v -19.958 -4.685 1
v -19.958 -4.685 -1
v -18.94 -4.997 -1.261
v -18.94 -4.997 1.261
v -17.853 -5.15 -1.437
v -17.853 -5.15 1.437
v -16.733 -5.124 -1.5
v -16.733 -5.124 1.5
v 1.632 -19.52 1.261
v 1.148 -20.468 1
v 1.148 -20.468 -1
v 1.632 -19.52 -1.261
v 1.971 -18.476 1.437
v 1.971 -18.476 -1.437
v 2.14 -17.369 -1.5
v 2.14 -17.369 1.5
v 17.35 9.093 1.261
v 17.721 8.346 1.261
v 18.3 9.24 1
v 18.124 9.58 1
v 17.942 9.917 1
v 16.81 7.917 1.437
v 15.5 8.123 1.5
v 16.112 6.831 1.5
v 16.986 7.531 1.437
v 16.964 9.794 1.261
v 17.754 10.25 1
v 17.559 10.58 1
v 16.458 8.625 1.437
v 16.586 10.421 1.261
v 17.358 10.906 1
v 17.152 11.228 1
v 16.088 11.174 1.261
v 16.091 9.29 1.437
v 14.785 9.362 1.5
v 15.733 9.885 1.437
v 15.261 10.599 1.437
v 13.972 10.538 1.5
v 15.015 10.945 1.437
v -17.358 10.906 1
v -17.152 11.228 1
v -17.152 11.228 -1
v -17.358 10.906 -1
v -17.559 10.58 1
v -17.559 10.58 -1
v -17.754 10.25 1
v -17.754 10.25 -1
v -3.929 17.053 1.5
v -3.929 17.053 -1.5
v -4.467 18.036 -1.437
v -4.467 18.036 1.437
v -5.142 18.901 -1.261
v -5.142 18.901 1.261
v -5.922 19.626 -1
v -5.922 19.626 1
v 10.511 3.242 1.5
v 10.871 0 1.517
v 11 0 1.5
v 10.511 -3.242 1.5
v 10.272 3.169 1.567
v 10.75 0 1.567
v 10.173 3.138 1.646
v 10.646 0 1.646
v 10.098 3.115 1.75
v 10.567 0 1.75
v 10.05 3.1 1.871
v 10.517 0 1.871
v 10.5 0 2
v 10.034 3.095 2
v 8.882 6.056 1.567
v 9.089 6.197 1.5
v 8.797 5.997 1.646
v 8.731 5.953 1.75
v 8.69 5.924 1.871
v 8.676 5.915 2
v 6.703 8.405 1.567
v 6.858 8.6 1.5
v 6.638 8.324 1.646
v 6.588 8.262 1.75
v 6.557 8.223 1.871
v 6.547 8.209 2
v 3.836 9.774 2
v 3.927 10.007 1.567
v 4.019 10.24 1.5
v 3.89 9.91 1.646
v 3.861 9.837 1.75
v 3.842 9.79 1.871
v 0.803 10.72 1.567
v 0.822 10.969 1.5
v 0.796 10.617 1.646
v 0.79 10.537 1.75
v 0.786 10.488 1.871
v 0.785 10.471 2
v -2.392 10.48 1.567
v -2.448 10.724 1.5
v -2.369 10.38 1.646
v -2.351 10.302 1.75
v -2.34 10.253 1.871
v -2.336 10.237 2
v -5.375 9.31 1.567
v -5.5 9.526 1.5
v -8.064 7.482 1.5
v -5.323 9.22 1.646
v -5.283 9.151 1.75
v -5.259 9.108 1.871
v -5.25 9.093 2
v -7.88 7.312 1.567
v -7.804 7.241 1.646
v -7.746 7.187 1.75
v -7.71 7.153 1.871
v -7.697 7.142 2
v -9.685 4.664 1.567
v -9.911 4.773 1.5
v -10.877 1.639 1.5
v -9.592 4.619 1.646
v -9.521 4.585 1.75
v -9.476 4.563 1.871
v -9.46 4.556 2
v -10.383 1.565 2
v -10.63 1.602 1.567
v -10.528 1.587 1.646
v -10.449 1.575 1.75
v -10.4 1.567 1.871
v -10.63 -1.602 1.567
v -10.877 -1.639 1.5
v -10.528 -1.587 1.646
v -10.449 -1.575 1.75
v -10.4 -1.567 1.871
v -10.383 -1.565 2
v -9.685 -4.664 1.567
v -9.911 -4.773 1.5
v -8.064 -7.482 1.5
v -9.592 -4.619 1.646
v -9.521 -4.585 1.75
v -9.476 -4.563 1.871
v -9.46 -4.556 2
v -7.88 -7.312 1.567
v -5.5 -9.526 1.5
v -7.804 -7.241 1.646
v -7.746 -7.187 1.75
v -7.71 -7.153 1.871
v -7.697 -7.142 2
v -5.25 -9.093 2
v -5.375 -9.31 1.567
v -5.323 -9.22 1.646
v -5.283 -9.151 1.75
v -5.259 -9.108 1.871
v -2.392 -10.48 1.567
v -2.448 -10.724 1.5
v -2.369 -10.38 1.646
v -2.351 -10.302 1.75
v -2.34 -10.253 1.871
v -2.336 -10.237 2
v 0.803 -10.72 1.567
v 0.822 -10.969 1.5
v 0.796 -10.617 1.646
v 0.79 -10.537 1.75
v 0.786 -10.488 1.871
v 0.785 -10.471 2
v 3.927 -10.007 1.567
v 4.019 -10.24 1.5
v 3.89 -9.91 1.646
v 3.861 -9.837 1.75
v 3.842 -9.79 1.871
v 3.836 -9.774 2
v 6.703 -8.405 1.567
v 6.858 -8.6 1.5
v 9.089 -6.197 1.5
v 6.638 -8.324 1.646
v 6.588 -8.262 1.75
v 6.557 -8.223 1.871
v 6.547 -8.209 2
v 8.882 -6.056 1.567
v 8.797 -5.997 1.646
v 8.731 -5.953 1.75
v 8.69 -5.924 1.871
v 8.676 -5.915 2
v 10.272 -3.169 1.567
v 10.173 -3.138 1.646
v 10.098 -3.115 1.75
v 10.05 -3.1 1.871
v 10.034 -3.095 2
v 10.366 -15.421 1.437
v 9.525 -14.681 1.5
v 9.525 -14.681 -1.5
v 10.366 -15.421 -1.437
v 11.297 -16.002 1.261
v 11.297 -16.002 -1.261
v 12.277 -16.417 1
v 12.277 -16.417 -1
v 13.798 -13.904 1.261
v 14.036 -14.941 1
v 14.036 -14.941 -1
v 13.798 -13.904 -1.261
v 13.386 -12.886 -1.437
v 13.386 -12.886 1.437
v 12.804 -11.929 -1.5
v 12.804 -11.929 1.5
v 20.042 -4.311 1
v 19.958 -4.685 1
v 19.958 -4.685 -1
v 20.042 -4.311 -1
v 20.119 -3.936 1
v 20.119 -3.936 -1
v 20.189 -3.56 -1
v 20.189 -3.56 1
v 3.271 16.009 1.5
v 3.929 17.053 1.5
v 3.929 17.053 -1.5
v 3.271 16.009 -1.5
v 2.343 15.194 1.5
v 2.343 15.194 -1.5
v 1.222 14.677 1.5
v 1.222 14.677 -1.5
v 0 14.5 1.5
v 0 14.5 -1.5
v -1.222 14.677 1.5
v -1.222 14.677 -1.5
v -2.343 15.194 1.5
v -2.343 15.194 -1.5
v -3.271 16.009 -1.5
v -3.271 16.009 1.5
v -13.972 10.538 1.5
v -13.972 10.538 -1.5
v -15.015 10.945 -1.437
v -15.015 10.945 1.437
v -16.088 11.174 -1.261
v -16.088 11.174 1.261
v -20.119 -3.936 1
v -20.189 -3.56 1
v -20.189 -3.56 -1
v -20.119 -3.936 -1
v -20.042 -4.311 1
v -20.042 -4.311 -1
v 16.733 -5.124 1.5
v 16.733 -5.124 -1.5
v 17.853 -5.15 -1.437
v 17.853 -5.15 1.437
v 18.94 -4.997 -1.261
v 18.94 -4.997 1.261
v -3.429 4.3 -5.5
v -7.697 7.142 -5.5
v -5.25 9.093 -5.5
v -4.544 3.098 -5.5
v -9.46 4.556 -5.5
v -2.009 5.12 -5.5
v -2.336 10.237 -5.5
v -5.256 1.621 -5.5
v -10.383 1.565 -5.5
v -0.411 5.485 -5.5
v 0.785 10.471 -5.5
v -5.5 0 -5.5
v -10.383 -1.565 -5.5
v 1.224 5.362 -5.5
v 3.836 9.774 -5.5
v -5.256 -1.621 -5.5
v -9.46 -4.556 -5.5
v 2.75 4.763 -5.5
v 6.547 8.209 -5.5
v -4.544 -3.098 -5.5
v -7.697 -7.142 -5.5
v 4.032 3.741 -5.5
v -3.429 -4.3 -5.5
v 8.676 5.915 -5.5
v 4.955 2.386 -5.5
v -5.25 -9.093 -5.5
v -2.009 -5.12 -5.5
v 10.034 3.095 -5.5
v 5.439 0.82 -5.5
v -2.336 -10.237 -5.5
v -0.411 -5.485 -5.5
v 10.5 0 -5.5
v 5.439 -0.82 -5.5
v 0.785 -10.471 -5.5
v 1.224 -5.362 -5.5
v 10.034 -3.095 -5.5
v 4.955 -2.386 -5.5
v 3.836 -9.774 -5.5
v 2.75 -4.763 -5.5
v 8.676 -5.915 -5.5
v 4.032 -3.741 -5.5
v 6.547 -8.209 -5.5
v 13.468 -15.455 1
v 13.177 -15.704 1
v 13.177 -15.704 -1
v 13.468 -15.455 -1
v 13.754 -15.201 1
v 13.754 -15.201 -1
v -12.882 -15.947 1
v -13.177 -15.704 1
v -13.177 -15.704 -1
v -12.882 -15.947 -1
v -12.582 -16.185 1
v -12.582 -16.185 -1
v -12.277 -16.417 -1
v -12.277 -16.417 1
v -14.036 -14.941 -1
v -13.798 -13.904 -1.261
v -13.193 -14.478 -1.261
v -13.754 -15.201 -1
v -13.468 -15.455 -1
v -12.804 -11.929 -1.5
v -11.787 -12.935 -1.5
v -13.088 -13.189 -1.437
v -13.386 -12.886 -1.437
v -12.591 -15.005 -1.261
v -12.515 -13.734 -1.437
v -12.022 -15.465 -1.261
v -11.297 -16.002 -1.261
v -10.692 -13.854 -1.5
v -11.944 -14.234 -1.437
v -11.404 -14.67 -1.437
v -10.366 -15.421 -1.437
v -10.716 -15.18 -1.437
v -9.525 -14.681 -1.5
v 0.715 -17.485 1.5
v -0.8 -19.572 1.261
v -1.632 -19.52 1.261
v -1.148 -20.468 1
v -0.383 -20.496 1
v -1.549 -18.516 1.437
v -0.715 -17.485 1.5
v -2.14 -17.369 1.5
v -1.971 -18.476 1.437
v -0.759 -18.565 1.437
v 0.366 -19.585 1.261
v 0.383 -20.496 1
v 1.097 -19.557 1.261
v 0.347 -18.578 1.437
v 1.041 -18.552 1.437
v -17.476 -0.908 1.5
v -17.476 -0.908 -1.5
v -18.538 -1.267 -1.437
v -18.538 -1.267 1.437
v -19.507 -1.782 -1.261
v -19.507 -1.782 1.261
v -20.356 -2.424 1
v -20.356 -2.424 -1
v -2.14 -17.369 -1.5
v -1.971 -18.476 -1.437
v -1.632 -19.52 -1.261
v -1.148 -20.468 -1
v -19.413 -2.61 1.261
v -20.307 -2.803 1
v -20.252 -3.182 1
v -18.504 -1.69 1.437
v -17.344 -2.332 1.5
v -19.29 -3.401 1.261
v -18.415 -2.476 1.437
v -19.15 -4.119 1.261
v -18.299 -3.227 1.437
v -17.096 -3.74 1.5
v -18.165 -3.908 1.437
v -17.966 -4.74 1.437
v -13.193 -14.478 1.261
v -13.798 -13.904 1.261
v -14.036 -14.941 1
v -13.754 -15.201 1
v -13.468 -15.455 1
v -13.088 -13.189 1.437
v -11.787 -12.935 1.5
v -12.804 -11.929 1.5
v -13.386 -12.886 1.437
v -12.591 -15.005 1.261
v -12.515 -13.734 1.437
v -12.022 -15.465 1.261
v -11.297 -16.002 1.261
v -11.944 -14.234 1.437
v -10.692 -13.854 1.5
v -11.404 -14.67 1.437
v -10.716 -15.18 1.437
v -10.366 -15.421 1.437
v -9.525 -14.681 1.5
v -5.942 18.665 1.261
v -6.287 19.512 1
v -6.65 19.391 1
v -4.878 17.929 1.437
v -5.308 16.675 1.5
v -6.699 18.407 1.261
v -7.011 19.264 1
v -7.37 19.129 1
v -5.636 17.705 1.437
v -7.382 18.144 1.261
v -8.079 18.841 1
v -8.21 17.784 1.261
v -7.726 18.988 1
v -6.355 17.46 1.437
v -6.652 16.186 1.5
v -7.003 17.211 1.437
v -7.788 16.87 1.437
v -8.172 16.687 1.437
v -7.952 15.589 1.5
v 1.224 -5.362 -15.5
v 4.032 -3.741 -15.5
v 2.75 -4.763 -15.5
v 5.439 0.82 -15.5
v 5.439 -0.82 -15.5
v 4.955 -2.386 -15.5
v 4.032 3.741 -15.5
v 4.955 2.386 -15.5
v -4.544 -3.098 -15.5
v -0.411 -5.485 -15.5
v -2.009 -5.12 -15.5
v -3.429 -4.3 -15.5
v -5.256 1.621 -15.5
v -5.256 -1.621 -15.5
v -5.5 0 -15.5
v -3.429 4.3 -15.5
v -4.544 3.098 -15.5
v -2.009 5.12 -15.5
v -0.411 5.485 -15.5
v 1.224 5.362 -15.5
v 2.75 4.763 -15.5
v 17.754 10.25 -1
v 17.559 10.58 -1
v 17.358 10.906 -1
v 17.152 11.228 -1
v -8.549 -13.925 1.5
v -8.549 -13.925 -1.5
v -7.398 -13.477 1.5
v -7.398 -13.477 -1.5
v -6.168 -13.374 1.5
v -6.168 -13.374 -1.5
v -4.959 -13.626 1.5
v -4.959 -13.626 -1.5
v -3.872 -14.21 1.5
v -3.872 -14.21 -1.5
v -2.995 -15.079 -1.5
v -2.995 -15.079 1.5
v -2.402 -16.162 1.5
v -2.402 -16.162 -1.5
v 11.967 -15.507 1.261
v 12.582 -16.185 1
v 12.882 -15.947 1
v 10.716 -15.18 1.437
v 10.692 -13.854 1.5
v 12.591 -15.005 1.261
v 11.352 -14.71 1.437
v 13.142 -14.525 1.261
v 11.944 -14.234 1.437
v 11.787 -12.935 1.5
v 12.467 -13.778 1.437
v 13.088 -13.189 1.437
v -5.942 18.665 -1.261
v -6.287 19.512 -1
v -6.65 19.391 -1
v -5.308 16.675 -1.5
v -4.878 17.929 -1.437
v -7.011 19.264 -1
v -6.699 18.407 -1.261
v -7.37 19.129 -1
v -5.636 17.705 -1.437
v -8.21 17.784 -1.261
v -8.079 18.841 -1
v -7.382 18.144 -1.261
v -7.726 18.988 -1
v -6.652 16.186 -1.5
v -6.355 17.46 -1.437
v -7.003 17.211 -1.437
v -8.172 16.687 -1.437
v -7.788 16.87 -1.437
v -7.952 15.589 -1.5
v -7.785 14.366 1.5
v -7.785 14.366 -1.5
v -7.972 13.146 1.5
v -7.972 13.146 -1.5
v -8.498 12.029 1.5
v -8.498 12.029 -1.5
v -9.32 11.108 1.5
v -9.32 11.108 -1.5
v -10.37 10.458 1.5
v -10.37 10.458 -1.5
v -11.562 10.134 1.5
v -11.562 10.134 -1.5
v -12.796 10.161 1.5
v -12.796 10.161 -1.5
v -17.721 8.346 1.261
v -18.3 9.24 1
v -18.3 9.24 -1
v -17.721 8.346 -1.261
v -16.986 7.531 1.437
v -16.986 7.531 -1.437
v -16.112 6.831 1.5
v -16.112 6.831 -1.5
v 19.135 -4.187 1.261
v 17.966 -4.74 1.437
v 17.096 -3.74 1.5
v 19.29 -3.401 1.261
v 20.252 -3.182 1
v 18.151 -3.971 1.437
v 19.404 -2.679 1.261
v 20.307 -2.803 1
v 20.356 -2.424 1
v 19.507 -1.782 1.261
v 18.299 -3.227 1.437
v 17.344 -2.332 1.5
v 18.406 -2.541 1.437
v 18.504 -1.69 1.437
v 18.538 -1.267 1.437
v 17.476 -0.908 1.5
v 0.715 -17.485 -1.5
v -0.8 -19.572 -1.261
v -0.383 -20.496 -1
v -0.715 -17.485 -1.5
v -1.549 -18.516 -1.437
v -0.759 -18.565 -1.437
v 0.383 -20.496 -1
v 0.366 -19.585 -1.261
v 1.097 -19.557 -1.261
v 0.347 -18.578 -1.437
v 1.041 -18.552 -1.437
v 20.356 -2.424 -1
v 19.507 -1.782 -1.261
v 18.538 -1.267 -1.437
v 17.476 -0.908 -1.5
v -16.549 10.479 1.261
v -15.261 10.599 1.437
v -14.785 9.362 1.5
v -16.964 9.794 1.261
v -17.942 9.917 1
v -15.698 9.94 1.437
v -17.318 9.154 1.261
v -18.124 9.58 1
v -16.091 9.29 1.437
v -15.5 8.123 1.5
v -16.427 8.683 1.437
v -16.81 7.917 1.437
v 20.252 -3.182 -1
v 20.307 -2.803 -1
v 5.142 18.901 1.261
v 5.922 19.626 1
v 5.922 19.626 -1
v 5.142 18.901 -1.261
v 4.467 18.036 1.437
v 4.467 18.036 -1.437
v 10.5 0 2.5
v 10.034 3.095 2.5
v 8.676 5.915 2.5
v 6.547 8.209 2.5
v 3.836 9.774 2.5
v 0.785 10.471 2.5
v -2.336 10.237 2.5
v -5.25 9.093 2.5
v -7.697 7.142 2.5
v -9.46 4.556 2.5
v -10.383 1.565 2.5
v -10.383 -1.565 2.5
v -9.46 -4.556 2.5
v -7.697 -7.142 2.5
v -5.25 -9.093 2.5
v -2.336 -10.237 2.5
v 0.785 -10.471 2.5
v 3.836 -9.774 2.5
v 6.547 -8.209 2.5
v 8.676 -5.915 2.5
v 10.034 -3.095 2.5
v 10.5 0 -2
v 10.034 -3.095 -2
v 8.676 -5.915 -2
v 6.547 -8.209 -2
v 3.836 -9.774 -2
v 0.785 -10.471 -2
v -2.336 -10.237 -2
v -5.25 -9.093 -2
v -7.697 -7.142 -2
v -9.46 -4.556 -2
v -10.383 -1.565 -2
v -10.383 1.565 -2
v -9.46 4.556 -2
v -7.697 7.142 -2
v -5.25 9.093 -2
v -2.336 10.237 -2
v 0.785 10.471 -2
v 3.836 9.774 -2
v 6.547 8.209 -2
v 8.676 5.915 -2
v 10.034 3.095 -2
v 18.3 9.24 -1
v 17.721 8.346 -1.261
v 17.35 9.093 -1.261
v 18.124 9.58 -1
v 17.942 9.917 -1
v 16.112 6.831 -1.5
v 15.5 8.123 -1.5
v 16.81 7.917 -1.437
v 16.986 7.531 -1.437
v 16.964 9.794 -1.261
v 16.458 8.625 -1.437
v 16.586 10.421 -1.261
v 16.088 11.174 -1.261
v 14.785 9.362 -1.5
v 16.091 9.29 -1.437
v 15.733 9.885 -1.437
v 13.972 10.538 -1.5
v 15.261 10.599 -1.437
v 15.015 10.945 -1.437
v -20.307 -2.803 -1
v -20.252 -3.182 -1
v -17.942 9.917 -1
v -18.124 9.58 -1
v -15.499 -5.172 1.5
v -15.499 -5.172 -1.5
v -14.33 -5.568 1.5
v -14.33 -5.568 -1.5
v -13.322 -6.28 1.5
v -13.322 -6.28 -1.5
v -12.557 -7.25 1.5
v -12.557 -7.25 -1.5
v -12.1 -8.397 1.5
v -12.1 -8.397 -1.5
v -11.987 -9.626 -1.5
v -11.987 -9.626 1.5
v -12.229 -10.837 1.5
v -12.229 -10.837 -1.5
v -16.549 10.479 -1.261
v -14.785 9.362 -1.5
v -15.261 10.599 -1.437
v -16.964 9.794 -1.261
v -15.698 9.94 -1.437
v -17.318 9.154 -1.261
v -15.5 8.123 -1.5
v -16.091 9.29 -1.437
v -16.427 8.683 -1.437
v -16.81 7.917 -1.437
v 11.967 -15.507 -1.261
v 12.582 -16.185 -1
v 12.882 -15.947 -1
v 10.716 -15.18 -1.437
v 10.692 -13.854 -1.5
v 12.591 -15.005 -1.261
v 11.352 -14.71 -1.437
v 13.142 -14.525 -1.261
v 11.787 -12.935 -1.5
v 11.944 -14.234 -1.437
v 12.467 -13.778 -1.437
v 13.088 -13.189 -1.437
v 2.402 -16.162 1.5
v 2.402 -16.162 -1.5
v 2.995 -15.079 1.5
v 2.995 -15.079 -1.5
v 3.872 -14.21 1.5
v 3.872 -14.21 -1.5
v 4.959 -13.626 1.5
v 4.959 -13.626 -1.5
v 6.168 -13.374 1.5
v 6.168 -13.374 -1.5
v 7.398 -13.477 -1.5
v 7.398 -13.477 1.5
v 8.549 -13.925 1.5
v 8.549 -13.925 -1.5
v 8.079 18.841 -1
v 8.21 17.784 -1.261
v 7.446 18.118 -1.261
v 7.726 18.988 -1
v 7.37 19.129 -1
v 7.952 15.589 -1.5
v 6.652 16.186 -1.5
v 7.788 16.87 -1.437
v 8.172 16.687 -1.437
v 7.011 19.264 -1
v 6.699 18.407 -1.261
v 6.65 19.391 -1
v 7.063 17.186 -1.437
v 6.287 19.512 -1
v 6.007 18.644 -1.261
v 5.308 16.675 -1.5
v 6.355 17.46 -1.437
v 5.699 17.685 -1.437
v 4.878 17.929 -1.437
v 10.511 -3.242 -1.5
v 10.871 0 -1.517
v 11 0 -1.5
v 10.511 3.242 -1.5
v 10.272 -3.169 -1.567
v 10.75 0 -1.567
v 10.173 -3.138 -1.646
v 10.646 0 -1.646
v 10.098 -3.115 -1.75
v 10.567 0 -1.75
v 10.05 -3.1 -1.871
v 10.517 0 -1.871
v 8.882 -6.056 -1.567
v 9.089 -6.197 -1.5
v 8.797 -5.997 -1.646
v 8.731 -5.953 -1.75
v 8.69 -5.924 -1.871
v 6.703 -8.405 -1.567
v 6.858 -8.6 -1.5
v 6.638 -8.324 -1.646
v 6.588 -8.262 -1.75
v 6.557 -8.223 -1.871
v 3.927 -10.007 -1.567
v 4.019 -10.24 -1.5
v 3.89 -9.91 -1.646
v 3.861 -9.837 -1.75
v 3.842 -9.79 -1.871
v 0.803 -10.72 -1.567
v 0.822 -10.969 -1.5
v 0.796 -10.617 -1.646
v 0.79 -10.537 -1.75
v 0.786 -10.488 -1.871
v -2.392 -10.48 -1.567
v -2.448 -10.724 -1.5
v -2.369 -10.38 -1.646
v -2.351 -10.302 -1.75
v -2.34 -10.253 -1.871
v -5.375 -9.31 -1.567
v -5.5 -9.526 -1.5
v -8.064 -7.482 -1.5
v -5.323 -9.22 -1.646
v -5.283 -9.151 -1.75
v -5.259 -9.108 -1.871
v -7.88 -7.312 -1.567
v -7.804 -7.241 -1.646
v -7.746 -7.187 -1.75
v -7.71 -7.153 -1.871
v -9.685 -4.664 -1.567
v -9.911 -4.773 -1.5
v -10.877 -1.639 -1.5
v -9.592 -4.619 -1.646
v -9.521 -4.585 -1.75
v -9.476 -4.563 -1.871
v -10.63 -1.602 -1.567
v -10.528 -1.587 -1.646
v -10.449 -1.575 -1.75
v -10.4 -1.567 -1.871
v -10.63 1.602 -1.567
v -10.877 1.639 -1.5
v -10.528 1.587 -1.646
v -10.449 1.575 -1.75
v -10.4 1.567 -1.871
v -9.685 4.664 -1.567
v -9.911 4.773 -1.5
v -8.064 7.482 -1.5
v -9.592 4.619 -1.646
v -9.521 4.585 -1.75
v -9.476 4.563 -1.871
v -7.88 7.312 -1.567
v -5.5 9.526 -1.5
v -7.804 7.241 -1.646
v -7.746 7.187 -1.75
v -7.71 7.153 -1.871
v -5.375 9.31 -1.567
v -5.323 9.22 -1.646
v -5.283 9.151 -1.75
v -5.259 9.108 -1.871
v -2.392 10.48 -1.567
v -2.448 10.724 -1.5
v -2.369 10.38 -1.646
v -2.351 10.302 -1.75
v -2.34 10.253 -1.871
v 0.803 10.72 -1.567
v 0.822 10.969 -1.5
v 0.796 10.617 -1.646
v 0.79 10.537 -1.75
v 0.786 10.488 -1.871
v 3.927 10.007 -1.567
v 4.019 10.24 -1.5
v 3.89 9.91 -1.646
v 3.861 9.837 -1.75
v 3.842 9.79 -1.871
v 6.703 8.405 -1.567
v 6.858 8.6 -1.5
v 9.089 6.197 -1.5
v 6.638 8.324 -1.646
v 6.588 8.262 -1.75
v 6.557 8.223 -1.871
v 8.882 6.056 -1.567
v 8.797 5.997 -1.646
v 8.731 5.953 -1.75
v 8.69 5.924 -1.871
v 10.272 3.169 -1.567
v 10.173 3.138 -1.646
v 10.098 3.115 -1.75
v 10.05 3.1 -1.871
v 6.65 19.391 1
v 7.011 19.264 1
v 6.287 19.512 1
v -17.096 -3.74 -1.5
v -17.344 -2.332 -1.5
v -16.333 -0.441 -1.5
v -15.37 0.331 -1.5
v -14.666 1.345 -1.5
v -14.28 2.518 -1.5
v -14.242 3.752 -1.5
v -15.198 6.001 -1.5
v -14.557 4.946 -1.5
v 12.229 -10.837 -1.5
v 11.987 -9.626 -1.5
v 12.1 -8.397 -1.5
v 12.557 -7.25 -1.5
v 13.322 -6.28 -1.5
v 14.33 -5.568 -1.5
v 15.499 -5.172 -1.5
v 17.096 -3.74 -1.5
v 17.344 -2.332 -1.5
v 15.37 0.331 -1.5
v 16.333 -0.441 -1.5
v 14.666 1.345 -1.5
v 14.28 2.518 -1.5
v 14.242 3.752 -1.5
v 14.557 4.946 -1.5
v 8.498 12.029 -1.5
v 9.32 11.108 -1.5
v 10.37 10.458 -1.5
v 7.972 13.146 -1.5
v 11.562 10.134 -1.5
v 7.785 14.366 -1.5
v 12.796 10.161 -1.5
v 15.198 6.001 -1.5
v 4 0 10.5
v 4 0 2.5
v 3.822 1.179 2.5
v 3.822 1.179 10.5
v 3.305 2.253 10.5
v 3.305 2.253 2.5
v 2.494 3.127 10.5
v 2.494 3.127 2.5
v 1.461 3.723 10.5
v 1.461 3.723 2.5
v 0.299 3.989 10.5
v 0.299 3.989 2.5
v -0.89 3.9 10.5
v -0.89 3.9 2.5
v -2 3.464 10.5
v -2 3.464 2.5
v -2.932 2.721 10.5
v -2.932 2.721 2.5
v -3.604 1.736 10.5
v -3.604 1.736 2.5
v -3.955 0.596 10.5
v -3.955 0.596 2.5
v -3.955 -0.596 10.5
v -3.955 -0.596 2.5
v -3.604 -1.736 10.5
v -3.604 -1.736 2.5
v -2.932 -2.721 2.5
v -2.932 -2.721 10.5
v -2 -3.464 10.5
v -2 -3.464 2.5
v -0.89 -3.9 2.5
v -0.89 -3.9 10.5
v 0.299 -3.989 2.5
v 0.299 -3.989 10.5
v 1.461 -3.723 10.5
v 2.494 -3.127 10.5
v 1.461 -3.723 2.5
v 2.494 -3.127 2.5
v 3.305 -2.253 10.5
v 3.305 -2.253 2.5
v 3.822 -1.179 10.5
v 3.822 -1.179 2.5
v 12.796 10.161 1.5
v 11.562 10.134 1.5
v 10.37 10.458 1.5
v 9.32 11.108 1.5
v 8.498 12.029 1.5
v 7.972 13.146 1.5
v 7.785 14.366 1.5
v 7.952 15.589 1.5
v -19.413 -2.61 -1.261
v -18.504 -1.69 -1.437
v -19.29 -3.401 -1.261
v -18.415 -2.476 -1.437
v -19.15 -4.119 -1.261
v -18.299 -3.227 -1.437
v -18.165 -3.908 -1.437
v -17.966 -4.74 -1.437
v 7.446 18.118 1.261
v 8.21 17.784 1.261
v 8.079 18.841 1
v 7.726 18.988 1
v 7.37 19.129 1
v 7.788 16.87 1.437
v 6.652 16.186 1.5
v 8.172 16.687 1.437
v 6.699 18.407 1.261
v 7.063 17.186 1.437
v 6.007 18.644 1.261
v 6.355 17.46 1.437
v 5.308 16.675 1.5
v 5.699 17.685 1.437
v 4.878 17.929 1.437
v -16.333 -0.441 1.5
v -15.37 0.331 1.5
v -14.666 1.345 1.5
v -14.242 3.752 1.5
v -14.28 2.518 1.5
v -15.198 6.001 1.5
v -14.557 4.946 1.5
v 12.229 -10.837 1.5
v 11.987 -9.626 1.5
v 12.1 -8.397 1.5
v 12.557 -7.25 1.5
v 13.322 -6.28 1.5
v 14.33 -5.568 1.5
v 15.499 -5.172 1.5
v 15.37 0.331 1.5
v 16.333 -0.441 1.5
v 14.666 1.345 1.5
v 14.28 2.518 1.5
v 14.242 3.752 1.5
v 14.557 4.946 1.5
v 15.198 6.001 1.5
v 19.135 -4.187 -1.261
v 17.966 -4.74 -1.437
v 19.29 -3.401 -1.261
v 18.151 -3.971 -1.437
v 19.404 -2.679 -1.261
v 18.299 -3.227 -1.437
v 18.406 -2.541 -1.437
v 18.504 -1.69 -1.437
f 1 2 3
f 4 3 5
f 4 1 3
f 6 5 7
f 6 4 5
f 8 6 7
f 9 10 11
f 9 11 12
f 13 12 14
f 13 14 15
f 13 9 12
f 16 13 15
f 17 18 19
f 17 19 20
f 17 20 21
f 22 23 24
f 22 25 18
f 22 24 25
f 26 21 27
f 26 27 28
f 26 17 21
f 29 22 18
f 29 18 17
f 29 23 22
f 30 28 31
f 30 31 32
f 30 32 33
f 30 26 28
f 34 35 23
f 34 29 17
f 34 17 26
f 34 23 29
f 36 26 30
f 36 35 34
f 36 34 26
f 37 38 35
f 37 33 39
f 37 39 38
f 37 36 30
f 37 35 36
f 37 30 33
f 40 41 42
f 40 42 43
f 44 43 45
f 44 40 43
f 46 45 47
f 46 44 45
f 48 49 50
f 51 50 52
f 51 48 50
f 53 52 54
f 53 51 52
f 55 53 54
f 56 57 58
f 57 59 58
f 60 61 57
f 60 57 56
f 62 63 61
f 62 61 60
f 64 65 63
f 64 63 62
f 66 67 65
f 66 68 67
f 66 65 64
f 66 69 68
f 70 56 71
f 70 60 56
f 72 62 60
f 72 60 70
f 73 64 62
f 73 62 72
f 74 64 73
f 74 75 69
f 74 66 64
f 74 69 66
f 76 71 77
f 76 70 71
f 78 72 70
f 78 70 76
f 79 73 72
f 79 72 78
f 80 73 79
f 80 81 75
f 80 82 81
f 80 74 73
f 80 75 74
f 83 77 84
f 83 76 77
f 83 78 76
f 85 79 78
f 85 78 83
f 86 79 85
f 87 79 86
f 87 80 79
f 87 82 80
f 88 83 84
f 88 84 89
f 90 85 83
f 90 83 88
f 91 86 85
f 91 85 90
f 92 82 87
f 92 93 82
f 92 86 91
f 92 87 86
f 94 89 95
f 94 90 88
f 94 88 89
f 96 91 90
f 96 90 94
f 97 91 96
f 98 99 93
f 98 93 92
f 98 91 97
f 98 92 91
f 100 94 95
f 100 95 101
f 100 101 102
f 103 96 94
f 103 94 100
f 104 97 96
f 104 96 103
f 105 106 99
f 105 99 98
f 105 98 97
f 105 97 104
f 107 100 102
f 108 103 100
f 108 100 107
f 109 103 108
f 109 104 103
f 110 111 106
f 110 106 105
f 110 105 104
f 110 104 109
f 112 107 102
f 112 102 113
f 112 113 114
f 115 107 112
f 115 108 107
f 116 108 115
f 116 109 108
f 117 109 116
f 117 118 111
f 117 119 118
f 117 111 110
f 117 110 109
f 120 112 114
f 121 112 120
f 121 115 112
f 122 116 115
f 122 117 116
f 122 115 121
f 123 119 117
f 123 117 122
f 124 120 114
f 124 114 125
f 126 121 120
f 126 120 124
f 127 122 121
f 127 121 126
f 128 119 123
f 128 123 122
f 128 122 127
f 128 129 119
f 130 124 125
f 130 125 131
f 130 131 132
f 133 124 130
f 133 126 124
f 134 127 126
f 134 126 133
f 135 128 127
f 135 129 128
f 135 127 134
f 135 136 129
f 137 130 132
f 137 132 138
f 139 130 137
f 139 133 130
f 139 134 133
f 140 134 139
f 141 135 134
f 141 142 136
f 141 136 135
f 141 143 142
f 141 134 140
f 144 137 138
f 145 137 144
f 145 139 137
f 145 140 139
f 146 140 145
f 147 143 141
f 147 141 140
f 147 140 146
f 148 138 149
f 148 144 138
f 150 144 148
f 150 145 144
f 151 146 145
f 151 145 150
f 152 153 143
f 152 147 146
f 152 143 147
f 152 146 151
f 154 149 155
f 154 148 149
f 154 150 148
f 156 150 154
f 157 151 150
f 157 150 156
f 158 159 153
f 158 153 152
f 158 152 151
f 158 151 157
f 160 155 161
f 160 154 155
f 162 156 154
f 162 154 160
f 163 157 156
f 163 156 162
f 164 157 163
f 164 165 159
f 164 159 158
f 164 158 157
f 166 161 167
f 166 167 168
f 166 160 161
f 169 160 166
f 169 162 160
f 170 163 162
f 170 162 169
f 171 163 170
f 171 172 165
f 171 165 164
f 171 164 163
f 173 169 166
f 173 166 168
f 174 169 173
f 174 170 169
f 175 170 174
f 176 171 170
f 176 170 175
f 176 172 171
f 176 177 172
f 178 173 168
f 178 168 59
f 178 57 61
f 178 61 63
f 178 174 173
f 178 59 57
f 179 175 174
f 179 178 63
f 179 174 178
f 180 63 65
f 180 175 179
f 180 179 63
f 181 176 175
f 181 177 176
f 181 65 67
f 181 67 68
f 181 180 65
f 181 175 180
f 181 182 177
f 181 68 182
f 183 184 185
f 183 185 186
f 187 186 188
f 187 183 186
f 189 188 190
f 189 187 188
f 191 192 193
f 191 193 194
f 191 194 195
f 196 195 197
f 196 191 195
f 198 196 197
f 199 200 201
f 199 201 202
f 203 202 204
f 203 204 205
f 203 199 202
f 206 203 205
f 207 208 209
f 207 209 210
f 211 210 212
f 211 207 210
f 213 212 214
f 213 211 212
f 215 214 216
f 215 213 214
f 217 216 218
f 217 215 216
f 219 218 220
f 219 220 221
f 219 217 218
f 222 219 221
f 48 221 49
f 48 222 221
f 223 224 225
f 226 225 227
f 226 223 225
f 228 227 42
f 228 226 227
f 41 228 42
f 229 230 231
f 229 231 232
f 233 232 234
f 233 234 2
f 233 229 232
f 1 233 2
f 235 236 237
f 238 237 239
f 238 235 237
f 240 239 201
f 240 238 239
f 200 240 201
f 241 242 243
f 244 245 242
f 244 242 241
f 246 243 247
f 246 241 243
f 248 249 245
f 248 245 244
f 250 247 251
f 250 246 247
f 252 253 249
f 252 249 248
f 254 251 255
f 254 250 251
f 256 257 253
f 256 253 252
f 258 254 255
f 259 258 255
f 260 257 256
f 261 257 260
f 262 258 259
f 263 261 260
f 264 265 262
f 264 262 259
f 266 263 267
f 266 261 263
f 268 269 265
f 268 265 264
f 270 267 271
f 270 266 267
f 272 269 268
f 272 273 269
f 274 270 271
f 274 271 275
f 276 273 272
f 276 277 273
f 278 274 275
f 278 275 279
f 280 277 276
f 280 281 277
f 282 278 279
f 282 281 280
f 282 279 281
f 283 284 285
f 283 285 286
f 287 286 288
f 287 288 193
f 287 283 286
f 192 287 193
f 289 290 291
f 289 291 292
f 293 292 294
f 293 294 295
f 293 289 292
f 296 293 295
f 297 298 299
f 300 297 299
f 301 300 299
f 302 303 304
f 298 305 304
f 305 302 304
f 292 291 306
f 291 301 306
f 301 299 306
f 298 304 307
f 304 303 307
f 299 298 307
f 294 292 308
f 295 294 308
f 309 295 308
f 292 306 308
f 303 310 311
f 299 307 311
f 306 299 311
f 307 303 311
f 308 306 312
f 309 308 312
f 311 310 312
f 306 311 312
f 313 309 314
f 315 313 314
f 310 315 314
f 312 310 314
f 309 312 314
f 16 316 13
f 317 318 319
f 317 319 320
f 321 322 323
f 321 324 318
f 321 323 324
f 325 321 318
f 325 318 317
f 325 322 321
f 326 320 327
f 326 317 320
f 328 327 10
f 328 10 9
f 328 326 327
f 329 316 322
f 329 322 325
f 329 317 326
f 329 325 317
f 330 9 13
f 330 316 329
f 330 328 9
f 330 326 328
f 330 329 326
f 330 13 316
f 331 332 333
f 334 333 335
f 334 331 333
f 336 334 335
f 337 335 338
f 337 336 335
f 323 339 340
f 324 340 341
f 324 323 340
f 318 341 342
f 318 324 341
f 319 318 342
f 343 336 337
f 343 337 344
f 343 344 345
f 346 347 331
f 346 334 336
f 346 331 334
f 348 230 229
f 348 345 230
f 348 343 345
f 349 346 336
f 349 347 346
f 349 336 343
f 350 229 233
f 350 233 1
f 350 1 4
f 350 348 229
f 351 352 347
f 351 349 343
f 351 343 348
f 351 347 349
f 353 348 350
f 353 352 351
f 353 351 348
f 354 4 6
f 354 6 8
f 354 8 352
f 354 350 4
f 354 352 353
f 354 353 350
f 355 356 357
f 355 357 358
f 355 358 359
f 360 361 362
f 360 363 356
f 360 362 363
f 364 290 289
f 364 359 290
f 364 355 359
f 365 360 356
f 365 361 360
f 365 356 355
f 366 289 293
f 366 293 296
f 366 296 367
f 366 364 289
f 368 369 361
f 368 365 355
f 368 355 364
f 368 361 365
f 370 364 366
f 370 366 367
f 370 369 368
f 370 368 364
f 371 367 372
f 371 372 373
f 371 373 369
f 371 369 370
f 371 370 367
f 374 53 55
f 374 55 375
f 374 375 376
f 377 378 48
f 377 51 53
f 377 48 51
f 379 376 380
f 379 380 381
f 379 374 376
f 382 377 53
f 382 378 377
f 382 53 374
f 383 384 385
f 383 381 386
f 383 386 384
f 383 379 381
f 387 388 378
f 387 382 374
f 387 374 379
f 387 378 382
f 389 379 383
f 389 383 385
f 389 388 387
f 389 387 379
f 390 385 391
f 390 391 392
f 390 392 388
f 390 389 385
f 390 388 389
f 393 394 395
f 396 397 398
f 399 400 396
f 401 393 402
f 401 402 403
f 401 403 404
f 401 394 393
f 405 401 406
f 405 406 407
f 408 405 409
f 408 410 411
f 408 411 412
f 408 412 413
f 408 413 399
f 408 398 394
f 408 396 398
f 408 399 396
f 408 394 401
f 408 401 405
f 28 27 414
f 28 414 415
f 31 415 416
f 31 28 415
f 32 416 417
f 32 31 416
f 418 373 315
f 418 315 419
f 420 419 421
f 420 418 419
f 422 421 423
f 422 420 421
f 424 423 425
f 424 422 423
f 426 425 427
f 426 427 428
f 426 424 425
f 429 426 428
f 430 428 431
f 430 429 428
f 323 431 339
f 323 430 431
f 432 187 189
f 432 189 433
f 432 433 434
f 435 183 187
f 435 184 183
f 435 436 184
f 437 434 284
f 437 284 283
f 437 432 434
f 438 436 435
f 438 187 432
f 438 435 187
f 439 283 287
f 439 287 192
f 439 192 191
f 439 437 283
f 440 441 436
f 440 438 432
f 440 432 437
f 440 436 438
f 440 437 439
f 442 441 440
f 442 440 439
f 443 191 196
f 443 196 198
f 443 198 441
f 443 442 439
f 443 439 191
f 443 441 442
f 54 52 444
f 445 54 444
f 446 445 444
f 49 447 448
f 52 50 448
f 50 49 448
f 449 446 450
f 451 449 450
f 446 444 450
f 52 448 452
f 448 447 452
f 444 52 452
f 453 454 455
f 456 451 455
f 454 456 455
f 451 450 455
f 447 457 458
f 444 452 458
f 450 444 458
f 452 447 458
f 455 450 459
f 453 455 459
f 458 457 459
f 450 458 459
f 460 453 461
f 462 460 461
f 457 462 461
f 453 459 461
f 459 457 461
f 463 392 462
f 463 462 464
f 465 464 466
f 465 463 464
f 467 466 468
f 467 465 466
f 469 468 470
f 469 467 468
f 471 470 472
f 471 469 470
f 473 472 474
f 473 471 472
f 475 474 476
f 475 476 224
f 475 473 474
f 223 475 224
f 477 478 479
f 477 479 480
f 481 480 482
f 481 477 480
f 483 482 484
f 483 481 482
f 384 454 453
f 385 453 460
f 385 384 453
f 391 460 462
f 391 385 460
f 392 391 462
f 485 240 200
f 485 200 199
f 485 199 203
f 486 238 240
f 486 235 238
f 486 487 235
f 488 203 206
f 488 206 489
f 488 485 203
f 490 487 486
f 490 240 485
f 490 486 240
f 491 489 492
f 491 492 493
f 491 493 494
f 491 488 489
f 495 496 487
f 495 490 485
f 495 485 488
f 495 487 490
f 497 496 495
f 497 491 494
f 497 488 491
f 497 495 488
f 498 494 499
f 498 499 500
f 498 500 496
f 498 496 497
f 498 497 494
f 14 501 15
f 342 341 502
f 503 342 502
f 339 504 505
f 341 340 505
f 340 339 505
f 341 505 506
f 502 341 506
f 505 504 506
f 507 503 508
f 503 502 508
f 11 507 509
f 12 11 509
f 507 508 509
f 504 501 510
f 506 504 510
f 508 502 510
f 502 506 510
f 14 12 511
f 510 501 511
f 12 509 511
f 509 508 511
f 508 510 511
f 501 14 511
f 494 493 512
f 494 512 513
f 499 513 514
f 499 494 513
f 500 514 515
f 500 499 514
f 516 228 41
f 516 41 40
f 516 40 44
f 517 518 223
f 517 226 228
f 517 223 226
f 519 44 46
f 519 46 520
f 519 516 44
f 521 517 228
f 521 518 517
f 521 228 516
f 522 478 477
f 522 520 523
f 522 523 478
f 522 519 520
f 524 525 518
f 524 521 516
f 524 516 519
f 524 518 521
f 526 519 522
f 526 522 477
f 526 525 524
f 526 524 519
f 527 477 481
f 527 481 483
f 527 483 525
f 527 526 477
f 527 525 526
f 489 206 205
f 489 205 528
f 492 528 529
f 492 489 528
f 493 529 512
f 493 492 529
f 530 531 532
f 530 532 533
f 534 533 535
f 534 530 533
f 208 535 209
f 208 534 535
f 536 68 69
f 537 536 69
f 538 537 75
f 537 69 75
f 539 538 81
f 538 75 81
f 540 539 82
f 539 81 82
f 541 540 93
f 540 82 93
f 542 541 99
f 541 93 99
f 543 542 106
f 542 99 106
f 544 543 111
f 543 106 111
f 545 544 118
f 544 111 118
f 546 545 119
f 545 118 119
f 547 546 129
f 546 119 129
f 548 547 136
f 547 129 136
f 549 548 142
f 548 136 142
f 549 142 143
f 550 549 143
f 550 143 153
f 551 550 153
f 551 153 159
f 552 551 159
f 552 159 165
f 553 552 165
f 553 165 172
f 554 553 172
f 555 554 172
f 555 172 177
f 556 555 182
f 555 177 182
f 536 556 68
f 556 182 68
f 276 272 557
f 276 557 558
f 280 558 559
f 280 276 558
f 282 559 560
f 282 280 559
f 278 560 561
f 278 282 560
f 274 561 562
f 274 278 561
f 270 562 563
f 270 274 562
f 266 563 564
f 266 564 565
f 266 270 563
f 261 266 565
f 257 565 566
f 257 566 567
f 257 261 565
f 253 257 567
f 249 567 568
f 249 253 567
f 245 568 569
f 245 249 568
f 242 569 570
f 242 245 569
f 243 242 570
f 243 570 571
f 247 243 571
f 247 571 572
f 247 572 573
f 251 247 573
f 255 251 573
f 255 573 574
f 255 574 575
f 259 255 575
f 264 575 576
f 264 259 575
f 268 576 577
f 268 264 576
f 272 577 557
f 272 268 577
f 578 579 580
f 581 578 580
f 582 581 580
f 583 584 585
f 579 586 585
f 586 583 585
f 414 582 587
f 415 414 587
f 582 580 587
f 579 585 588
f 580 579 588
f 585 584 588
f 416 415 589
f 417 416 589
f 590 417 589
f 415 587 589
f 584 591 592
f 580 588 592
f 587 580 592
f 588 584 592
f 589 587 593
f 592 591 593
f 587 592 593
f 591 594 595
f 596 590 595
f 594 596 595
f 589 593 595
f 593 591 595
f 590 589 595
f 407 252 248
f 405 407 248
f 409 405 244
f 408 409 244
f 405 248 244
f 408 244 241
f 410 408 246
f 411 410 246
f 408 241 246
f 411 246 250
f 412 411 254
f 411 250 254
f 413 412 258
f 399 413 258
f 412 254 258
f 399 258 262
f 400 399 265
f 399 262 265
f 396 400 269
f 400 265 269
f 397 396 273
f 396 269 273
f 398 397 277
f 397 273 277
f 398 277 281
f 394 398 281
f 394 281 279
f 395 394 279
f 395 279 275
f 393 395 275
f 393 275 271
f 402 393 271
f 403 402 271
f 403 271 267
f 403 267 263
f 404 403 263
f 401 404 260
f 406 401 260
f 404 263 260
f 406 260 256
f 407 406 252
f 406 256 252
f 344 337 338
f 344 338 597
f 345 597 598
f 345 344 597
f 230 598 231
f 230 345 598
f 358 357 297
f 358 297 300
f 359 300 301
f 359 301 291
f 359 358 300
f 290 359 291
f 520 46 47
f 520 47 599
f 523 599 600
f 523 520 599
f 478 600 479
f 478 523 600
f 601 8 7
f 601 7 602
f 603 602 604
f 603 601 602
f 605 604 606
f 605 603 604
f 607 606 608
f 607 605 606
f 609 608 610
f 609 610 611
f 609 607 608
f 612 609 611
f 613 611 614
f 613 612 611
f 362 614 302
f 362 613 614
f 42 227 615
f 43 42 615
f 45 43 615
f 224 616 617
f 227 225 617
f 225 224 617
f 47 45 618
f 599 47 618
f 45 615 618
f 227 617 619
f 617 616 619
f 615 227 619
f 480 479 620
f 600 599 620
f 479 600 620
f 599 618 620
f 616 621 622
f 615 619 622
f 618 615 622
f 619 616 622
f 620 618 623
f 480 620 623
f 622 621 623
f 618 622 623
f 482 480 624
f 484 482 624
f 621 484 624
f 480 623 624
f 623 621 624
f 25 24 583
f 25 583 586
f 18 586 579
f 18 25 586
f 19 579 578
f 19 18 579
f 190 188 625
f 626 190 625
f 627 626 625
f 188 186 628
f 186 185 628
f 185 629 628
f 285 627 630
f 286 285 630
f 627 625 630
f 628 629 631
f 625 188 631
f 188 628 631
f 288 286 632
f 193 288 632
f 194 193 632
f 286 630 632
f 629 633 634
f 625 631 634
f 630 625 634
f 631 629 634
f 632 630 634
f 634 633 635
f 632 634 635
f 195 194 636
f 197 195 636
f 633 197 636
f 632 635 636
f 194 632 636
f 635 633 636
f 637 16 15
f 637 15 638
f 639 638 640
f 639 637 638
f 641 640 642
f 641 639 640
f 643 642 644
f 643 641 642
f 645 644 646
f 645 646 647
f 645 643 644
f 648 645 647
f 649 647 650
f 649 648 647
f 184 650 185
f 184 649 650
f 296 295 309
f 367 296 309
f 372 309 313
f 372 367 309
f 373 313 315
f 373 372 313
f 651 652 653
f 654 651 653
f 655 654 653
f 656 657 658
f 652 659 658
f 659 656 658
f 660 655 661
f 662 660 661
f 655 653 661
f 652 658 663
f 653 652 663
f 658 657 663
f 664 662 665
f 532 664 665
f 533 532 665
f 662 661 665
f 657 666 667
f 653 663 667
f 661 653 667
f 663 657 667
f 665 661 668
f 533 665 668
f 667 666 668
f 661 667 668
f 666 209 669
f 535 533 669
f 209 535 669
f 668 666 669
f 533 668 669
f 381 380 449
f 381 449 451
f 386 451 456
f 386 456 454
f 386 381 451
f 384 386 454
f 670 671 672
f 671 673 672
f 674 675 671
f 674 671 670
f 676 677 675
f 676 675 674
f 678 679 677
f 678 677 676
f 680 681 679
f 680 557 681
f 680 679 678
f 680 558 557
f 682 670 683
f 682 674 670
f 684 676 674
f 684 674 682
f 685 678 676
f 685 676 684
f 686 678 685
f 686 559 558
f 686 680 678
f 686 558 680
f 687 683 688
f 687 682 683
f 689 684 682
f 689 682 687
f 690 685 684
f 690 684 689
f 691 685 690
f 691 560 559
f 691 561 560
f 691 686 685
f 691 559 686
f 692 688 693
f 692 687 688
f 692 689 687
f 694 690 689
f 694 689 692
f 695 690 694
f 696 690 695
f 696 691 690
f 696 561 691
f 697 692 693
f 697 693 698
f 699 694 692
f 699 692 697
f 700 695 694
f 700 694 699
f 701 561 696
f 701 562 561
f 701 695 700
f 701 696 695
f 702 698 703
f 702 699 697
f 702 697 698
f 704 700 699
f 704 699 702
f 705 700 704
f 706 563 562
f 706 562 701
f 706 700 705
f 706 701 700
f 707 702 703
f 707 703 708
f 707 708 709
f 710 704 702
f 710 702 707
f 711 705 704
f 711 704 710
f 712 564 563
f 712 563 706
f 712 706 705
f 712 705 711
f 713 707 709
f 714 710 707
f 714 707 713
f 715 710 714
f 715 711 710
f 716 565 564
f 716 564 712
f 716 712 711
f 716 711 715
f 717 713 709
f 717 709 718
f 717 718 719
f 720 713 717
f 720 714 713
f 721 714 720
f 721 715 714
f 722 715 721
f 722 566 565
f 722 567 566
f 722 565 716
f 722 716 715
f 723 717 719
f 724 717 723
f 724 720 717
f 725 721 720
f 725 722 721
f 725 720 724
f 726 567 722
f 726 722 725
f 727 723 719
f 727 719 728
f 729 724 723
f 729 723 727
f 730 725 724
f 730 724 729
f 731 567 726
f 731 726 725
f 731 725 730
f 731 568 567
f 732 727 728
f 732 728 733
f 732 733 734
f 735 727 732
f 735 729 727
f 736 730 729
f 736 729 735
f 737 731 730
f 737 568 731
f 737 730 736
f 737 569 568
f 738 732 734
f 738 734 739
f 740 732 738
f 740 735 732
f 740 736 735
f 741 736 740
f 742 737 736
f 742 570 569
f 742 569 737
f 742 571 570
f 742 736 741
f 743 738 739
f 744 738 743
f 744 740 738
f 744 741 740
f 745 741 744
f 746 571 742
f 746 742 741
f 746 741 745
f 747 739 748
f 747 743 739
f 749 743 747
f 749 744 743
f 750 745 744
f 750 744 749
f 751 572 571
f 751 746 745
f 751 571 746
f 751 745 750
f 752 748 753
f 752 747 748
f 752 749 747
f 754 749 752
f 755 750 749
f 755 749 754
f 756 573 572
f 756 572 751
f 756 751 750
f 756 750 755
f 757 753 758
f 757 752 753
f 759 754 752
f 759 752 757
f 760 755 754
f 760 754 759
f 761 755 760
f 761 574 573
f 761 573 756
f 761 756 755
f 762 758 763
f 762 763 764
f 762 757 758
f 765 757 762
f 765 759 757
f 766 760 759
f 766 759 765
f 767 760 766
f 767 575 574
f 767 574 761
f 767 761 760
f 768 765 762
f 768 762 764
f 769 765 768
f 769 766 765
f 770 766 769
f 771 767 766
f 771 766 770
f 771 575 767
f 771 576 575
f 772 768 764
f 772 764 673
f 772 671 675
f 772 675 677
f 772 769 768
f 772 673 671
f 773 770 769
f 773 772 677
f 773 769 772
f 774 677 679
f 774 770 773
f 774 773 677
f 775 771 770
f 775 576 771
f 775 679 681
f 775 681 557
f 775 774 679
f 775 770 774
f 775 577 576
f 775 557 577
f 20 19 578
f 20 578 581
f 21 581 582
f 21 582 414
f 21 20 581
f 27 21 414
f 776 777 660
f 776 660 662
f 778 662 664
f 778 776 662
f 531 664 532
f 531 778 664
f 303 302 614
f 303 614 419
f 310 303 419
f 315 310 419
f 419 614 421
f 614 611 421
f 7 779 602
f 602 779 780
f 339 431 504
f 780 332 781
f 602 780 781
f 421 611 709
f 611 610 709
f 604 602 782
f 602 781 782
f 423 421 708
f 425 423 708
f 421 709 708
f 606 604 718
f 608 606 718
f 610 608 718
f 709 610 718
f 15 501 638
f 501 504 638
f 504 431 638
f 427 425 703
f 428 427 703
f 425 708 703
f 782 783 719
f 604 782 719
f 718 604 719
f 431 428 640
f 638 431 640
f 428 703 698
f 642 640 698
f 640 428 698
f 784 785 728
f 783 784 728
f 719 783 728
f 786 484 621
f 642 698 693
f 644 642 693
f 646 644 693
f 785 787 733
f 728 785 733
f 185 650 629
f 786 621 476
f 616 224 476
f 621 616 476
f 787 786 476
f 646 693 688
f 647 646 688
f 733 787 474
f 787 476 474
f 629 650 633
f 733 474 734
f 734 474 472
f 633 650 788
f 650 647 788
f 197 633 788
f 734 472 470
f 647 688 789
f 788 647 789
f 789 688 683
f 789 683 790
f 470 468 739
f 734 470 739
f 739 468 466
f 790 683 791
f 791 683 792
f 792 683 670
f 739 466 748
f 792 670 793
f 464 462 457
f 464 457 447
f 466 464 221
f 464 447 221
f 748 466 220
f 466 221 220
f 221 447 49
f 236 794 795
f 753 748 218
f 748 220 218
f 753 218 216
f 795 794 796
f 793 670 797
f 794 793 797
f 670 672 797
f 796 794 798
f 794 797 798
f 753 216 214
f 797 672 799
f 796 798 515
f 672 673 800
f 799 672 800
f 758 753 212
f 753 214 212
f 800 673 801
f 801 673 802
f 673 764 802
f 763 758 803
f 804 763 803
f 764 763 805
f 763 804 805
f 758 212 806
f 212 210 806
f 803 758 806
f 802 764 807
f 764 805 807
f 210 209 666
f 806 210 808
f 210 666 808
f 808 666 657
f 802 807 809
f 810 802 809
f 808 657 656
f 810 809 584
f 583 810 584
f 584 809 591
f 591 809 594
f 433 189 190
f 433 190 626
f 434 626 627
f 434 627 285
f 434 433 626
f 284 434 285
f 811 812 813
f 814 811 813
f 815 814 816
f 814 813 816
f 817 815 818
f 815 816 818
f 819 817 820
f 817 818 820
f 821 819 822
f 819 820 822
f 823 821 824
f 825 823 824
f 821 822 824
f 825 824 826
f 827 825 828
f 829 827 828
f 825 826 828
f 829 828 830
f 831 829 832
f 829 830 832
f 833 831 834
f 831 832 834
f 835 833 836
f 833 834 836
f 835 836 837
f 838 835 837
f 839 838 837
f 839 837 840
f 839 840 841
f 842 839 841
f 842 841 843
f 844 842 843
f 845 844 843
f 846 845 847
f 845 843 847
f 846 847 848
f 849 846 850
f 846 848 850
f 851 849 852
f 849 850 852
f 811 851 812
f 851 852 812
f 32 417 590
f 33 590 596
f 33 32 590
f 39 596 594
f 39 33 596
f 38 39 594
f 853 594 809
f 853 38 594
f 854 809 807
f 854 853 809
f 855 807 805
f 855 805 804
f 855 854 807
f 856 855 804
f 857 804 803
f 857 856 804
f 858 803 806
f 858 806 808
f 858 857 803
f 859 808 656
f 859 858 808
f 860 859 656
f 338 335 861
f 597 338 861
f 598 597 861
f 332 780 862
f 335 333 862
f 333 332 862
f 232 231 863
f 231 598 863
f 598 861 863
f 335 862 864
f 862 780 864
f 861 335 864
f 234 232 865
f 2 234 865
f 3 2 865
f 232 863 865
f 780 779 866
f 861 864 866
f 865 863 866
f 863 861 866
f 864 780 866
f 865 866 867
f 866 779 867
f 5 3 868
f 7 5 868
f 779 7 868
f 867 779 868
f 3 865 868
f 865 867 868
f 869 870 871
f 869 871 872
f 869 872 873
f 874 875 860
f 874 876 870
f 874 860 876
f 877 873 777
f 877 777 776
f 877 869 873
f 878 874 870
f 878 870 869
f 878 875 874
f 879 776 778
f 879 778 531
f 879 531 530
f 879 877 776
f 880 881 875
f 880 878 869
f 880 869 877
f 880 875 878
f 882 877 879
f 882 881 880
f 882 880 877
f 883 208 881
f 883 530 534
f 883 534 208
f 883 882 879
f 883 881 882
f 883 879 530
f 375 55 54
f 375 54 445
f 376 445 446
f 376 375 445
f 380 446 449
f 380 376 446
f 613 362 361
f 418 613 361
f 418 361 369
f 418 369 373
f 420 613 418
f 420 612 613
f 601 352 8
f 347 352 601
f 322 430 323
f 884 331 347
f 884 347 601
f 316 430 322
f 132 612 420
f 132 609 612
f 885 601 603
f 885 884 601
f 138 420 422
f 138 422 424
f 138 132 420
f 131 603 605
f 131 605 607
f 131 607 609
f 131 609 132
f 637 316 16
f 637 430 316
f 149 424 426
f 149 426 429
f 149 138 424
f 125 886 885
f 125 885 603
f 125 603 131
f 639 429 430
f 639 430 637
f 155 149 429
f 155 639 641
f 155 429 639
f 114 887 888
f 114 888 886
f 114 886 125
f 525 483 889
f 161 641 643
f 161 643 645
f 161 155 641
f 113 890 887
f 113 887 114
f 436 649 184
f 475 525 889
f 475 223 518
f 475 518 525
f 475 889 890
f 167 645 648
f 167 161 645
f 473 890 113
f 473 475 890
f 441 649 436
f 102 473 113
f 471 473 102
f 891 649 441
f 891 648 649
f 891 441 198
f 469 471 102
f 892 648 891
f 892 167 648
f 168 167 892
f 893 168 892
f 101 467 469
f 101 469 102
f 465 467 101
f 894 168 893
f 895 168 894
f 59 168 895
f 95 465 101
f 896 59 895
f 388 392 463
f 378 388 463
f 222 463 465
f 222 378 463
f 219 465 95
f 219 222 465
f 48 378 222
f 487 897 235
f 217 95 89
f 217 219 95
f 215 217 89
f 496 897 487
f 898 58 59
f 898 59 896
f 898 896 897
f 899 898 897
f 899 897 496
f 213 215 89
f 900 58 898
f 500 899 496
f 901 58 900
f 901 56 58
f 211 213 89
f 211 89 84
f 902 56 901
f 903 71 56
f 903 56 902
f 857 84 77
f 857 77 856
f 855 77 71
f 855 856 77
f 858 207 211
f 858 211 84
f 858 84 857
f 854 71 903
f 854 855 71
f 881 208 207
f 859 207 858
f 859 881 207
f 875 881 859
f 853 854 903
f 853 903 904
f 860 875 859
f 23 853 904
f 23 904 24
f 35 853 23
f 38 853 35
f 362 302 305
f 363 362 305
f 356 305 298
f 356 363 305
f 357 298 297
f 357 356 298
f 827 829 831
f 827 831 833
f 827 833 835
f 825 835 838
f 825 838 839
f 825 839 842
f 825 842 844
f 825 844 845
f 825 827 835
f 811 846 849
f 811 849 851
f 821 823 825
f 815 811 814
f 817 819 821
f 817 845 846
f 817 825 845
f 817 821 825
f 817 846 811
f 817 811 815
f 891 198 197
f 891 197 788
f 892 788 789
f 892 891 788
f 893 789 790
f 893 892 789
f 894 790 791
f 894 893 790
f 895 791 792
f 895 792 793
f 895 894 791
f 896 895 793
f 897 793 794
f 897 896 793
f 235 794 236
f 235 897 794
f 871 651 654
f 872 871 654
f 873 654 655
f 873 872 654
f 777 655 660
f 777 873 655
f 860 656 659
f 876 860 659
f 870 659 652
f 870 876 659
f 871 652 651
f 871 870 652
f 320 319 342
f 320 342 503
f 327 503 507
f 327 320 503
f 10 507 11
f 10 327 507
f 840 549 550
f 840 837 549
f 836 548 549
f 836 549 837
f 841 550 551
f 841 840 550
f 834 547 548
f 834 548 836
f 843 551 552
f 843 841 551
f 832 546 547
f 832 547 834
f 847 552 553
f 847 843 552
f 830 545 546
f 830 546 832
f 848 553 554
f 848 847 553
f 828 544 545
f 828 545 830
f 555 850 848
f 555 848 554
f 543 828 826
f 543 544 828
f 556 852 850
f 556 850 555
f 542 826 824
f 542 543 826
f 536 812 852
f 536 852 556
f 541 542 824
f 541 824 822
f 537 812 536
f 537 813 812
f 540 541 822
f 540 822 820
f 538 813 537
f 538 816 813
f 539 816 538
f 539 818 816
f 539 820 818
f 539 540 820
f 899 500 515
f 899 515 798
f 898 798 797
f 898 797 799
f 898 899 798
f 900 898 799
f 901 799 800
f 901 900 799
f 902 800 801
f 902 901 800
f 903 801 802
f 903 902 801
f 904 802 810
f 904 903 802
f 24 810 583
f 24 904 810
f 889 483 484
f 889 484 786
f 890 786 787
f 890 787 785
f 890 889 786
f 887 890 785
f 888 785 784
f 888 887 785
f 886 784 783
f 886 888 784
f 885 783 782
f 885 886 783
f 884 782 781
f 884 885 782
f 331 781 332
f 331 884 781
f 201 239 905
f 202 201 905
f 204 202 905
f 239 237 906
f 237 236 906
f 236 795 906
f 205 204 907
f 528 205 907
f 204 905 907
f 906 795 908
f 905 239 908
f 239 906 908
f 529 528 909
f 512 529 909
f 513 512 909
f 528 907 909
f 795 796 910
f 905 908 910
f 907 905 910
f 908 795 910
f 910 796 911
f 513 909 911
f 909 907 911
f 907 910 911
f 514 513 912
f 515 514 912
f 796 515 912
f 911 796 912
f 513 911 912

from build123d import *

# Parameters (mm, degrees)
BOSS_EXTRUDE1_DEPTH = 1.5
SKETCH3_R           = 10.5
BOSS_EXTRUDE2_DEPTH = 1
FILLET1_R           = 0.5
BOSS_EXTRUDE3_START = 4
SKETCH4_R           = 10.5
BOSS_EXTRUDE3_DEPTH = 4
FILLET2_R           = 0.5
SKETCH6_R           = 4
BOSS_EXTRUDE4_DEPTH = 8
SKETCH7_R           = 5.5
BOSS_EXTRUDE5_DEPTH = 10


with BuildPart() as part:
    # Sketch1 → Boss-Extrude1 (new, symmetric)
    with BuildSketch(Plane.XY):
        with BuildLine():
            ThreePointArc((8.079170849, 18.840833272), (7.548253676, 19.059744658), (7.011412938, 19.263698726))
            ThreePointArc((7.011412938, 19.263698726), (6.469069926, 19.452535421), (5.92165025, 19.62610655))
            ThreePointArc((5.92165025, 19.62610655), (4.769916061, 18.460076292), (3.92920603, 17.053191489))
            ThreePointArc((3.92920603, 17.053191489), (0, 14.5), (-3.92920603, 17.053191489))
            ThreePointArc((-3.92920603, 17.053191489), (-4.769916061, 18.460076292), (-5.92165025, 19.62610655))
            ThreePointArc((-5.92165025, 19.62610655), (-6.469069926, 19.452535421), (-7.011412938, 19.263698726))
            ThreePointArc((-7.011412938, 19.263698726), (-7.548253676, 19.059744658), (-8.079170849, 18.840833272))
            ThreePointArc((-8.079170849, 18.840833272), (-8.211940621, 17.207281806), (-7.95163375, 15.58914753))
            ThreePointArc((-7.95163375, 15.58914753), (-9.32042034, 11.107644425), (-13.97152664, 10.537857626))
            ThreePointArc((-13.97152664, 10.537857626), (-15.519876007, 11.07519592), (-17.151665385, 11.228106453))
            ThreePointArc((-17.151665385, 11.228106453), (-17.459443815, 10.743268669), (-17.753520778, 10.25))
            ThreePointArc((-17.753520778, 10.25), (-18.033665494, 9.748687545), (-18.299658117, 9.239724714))
            ThreePointArc((-18.299658117, 9.239724714), (-17.351339022, 7.903008926), (-16.111815726, 6.830768187))
            ThreePointArc((-16.111815726, 6.830768187), (-14.279712419, 2.517898576), (-17.476414659, -0.908256936))
            ThreePointArc((-17.476414659, -0.908256936), (-19.007913485, -1.491891711), (-20.356225667, -2.423649439))
            ThreePointArc((-20.356225667, -2.423649439), (-20.280349902, -2.992892892), (-20.188558937, -3.559787642))
            ThreePointArc((-20.188558937, -3.559787642), (-20.080924805, -4.123888815), (-19.957531975, -4.684753727))
            ThreePointArc((-19.957531975, -4.684753727), (-18.371853055, -5.099169663), (-16.73310006, -5.123803506))
            ThreePointArc((-16.73310006, -5.123803506), (-12.557368355, -7.25), (-12.80389403, -11.929387983))
            ThreePointArc((-12.80389403, -11.929387983), (-13.601936994, -13.360906629), (-14.035881725, -14.941352824))
            ThreePointArc((-14.035881725, -14.941352824), (-13.611854879, -15.328646605), (-13.177145999, -15.703911084))
            ThreePointArc((-13.177145999, -15.703911084), (-12.732096226, -16.066851767), (-12.277054818, -16.417183833))
            ThreePointArc((-12.277054818, -16.417183833), (-10.795972864, -15.715390096), (-9.524780909, -14.680890594))
            ThreePointArc((-9.524780909, -14.680890594), (-4.959292078, -13.625543001), (-2.140289085, -17.368625813))
            ThreePointArc((-2.140289085, -17.368625813), (-1.831463015, -18.978204846), (-1.147992733, -20.467831167))
            ThreePointArc((-1.147992733, -20.467831167), (-0.574221679, -20.491956214), (0, -20.5))
            ThreePointArc((0, -20.5), (0.574221679, -20.491956214), (1.147992733, -20.467831167))
            ThreePointArc((1.147992733, -20.467831167), (1.831463015, -18.978204846), (2.140289085, -17.368625813))
            ThreePointArc((2.140289085, -17.368625813), (4.959292078, -13.625543001), (9.524780909, -14.680890594))
            ThreePointArc((9.524780909, -14.680890594), (10.795972864, -15.715390096), (12.277054818, -16.417183833))
            ThreePointArc((12.277054818, -16.417183833), (12.732096226, -16.066851767), (13.177145999, -15.703911084))
            ThreePointArc((13.177145999, -15.703911084), (13.611854879, -15.328646605), (14.035881725, -14.941352824))
            ThreePointArc((14.035881725, -14.941352824), (13.601936994, -13.360906629), (12.80389403, -11.929387983))
            ThreePointArc((12.80389403, -11.929387983), (12.557368355, -7.25), (16.73310006, -5.123803506))
            ThreePointArc((16.73310006, -5.123803506), (18.371853055, -5.099169663), (19.957531975, -4.684753727))
            ThreePointArc((19.957531975, -4.684753727), (20.080924805, -4.123888815), (20.188558937, -3.559787642))
            ThreePointArc((20.188558937, -3.559787642), (20.280349902, -2.992892892), (20.356225667, -2.423649439))
            ThreePointArc((20.356225667, -2.423649439), (19.007913485, -1.491891711), (17.476414659, -0.908256936))
            ThreePointArc((17.476414659, -0.908256936), (14.279712419, 2.517898576), (16.111815726, 6.830768187))
            ThreePointArc((16.111815726, 6.830768187), (17.351339022, 7.903008926), (18.299658117, 9.239724714))
            ThreePointArc((18.299658117, 9.239724714), (18.033665494, 9.748687545), (17.753520778, 10.25))
            ThreePointArc((17.753520778, 10.25), (17.459443815, 10.743268669), (17.151665385, 11.228106453))
            ThreePointArc((17.151665385, 11.228106453), (15.519876007, 11.07519592), (13.97152664, 10.537857626))
            ThreePointArc((13.97152664, 10.537857626), (9.32042034, 11.107644425), (7.95163375, 15.58914753))
            ThreePointArc((7.95163375, 15.58914753), (8.211940621, 17.207281806), (8.079170849, 18.840833272))
        make_face()
    extrude(amount=BOSS_EXTRUDE1_DEPTH, both=True)

    # Sketch2 → Cut-Revolve2 (revolve, cut)
    with BuildSketch(Plane(origin=(0, 0, 0), x_dir=(0, 0, -1), z_dir=(1, 0, 0))):
        with BuildLine():
            Line((-1.5, -17.5), (-1.5, -20.5))
            Line((-1.5, -20.5), (-1, -20.5))
            ThreePointArc((-1, -20.5), (-1.374143795, -19.020690633), (-1.5, -17.5))
        make_face()
    cut_revolve2 = revolve(axis=Axis((0, 0, 0), (0, 0, 1)), mode=Mode.SUBTRACT)

    # Mirror1: Cut-Revolve2 across plane
    add(cut_revolve2.mirror(Plane.XY), mode=Mode.SUBTRACT)

    # Sketch3 → Boss-Extrude2 (add)
    with BuildSketch(Plane.XY.offset(1.5)):
        Circle(SKETCH3_R)
    extrude(amount=BOSS_EXTRUDE2_DEPTH)

    # Fillet1
    fillet1_edges = [part.edges().sort_by_distance(p)[0] for p in [
        (-10.5, 0, 1.5),
    ]]
    fillet(fillet1_edges, radius=FILLET1_R)

    # Sketch4 → Boss-Extrude3 (add)
    with BuildSketch(Plane(origin=(0, 0, -1.5), x_dir=(-1, 0, 0), z_dir=(0, 0, -1)).offset(BOSS_EXTRUDE3_START)):
        with Locations(Location((0, 0, 0), (0, 0, 180))):
            Circle(SKETCH4_R)
    extrude(amount=-BOSS_EXTRUDE3_DEPTH)

    # Fillet2
    fillet2_edges = [part.edges().sort_by_distance(p)[0] for p in [
        (-10.5, 0, -1.5),
    ]]
    fillet(fillet2_edges, radius=FILLET2_R)

    # Sketch6 → Boss-Extrude4 (add)
    with BuildSketch(Plane.XY.offset(2.5)):
        Circle(SKETCH6_R)
    extrude(amount=BOSS_EXTRUDE4_DEPTH)

    # Sketch7 → Boss-Extrude5 (add)
    with BuildSketch(Plane(origin=(0, 0, -5.5), x_dir=(-1, 0, 0), z_dir=(0, 0, -1))):
        Circle(SKETCH7_R)
    extrude(amount=BOSS_EXTRUDE5_DEPTH)


solid = part.part
